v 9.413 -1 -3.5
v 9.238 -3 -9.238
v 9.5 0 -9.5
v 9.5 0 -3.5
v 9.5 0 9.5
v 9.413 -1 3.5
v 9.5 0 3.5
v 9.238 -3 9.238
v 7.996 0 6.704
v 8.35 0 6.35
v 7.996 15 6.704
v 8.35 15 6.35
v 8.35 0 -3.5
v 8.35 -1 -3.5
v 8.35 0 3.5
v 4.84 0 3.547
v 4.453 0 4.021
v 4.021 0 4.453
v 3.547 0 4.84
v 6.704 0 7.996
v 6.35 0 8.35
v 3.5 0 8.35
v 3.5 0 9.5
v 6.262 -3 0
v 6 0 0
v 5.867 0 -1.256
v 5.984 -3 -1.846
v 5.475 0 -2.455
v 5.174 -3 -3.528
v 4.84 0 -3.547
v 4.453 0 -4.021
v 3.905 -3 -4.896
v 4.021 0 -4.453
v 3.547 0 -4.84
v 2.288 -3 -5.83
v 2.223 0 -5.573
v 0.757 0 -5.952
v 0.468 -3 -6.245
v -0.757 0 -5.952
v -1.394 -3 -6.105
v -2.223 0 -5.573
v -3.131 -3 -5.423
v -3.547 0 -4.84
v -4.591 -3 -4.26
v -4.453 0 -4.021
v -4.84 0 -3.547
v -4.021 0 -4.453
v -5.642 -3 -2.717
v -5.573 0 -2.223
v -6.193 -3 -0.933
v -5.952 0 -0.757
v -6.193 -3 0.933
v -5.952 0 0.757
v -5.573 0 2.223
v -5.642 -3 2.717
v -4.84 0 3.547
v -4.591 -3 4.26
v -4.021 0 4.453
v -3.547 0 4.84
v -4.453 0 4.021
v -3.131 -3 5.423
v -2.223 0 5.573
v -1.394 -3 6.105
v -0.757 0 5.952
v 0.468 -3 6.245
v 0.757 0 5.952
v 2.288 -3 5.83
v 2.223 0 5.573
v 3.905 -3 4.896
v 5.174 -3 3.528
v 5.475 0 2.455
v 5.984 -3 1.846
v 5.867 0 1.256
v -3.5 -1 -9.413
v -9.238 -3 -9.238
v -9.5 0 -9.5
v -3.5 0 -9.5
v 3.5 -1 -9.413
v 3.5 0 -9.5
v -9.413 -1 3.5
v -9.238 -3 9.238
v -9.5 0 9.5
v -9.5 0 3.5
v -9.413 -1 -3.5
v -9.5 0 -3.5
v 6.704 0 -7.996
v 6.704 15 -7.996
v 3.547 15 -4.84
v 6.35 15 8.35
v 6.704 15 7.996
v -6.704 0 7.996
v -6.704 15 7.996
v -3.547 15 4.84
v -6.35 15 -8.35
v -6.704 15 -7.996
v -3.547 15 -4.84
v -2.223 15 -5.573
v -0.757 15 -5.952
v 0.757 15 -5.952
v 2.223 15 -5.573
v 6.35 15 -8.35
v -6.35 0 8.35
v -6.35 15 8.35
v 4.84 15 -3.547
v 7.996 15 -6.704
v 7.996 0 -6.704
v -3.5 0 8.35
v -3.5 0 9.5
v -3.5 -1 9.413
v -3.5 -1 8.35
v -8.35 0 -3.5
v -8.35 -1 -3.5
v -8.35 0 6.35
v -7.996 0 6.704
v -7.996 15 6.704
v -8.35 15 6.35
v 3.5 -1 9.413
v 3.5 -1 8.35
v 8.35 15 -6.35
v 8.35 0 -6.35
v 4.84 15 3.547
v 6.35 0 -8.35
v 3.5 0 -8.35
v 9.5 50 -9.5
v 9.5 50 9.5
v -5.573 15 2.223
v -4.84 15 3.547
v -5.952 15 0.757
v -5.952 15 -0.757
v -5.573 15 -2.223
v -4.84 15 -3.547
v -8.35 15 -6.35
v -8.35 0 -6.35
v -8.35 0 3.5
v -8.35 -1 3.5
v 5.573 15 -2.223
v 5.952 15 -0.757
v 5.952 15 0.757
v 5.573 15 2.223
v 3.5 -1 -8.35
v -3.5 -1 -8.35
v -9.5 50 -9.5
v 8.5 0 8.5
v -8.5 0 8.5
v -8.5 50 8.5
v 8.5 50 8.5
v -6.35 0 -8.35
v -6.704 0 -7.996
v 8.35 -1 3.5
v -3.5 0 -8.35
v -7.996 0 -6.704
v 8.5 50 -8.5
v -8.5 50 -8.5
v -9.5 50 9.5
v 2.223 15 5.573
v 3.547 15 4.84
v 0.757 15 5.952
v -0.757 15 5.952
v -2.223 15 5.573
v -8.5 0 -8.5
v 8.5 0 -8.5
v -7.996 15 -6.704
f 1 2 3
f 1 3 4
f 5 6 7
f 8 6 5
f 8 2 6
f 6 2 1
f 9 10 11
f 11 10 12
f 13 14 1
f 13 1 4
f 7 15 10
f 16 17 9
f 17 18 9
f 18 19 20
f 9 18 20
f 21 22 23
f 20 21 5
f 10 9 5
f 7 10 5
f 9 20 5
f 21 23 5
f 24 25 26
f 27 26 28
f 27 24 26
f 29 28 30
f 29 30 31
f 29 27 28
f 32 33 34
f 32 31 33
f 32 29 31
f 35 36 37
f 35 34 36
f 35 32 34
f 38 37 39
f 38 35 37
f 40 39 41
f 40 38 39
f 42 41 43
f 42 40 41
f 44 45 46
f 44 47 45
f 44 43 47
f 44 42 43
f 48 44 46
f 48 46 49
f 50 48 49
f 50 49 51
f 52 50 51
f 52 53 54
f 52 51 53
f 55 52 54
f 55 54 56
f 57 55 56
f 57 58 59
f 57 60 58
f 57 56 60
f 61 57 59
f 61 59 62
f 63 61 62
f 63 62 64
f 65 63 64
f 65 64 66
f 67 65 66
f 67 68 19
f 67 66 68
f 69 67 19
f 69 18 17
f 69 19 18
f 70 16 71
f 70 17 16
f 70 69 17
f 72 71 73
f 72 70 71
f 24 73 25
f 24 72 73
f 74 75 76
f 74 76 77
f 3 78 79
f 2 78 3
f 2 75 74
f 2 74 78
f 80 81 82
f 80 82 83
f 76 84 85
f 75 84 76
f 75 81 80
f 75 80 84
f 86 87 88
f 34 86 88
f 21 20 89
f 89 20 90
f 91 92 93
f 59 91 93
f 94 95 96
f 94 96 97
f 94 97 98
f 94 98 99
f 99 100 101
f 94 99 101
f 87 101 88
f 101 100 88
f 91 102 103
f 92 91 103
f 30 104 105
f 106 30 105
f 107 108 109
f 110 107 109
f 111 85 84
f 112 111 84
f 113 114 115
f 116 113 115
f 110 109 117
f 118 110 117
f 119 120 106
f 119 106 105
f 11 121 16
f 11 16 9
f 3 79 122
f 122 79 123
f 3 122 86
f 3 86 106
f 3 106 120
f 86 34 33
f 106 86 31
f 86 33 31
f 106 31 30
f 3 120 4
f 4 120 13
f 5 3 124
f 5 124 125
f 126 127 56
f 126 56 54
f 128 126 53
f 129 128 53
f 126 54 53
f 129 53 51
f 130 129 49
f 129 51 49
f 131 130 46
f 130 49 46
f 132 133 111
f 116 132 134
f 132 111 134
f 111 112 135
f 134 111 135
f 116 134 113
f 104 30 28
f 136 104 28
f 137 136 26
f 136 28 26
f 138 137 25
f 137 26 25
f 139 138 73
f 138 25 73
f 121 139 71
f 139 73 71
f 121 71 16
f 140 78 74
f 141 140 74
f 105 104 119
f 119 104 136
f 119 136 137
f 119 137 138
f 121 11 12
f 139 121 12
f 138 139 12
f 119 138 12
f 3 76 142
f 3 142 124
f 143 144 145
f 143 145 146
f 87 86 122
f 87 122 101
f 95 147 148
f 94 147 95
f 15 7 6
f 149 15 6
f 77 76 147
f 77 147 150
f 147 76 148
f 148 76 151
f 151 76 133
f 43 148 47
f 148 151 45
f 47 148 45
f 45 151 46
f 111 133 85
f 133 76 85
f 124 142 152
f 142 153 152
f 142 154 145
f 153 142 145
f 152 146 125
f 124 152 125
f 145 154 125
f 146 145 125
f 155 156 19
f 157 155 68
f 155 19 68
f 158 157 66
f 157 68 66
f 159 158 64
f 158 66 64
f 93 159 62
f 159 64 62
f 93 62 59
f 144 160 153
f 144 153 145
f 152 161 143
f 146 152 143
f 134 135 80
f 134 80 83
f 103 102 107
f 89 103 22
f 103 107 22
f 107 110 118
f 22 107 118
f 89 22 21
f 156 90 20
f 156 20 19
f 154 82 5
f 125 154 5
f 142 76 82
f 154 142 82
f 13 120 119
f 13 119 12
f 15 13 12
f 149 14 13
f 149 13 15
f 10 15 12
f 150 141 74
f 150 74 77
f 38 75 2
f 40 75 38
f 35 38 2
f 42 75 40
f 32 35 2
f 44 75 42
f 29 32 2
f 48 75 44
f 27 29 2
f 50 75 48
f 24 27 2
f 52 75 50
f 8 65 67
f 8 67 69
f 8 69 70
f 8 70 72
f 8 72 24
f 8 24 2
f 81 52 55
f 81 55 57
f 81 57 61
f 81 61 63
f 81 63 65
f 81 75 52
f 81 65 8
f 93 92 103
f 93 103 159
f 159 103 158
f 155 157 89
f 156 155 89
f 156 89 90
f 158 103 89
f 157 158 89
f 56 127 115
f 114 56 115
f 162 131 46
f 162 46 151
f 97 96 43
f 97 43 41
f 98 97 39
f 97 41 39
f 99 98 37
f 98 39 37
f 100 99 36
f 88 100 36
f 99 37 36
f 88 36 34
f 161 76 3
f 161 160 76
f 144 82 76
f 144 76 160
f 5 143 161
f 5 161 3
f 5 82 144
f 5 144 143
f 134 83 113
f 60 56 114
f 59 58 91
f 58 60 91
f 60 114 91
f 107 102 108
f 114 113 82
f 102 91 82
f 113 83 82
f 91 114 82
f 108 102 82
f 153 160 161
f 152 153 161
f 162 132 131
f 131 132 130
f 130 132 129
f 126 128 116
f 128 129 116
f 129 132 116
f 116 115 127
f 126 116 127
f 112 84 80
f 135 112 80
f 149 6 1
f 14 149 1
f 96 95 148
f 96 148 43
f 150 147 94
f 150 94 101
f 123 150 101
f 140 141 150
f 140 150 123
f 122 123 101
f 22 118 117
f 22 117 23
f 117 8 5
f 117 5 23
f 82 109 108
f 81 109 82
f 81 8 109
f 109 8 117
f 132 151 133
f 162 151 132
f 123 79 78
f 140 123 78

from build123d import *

# Parameters (mm, degrees)
F0_W            = 19
F0_H            = 19
F0_W_2          = 17
F0_H_2          = 17
F1_DEPTH        = 50
F2_W            = 16.7
F2_H            = 16.7
F2_R            = 6
F3_DEPTH        = 15
F4_W            = 19
F4_H            = 19
F4_R            = 6
F5_DEPTH        = 3
F5_TAPER        = 5
F6_W            = 7
F6_H            = 1
F7_DEPTH        = 1.15
F7_COPIES_COUNT = 4
F8_SIZE         = 2
F10_DEPTH       = 15


# Not quite as in the source:
# - a pattern or mirror of a feature is missing from the dataset's text; its kind, count and spacing are read off the source's solid


with BuildPart() as f1:
    # F0 (on Front) → F1 (new body)
    with BuildSketch(Plane.XZ):
        Rectangle(F0_W, F0_H)
        Rectangle(F0_W_2, F0_H_2, mode=Mode.SUBTRACT)
    extrude(amount=-F1_DEPTH)


with BuildPart() as f3:
    # F2 (on face) → F3 (new body)
    with BuildSketch(Plane.XZ):
        Rectangle(F2_W, F2_H)
        Circle(F2_R, mode=Mode.SUBTRACT)
    extrude(amount=-F3_DEPTH)

    # F4 (on face) → F5 (join)
    with BuildSketch(Plane.XZ):
        Rectangle(F4_W, F4_H)
        Circle(F4_R, mode=Mode.SUBTRACT)
    extrude(amount=F5_DEPTH, taper=F5_TAPER)

    # F6 (on face) → F7 (cut)
    with BuildSketch(Plane.XY.offset(9.5)):
        with Locations((0, -0.5)):
            Rectangle(F6_W, F6_H)
        with Locations((0, 0.5)):
            Rectangle(F6_W, F6_H)
    f7 = extrude(amount=-F7_DEPTH, mode=Mode.SUBTRACT)

    # F7_copies: F7 ×4 about axis
    f7_copies_axis = Axis((0, 0, 0), (0, 1, 0))
    for i in range(1, F7_COPIES_COUNT):
        add(f7.rotate(f7_copies_axis, i * 360 / F7_COPIES_COUNT), mode=Mode.SUBTRACT)

    # F8
    f8_edges = [f3.edges().sort_by_distance(p)[0] for p in [
        (8.35, 7.5, 8.35),
        (8.35, 7.5, -8.35),
        (-8.35, 7.5, -8.35),
        (-8.35, 7.5, 8.35),
    ]]
    chamfer(f8_edges, length=F8_SIZE)

    # F9 (on face) → F10 (cut, through all)
    with BuildSketch(Plane(origin=(0, 15, 0), x_dir=(-1, 0, 0), z_dir=(0, 1, 0))):
        with BuildLine():
            Line((7.9964466094, 6.7035533906), (6.7035533906, 7.9964466094))
            Line((6.7035533906, 7.9964466094), (3.5466556766, 4.8395488954))
            ThreePointArc((3.5466556766, 4.8395488954), (4.2426406871, 4.2426406871), (4.8395488954, 3.5466556766))
            Line((4.8395488954, 3.5466556766), (7.9964466094, 6.7035533906))
        make_face()
        Polygon((12.7629971477, 14.0558903665), (6.7035533906, 7.9964466094), (7.9964466094, 6.7035533906), (13.9659964202, 12.6731032014), align=None)
        with BuildLine():
            ThreePointArc((4.8395488954, 3.5466556766), (4.2426406871, 4.2426406871), (3.5466556766, 4.8395488954))
            Line((3.5466556766, 4.8395488954), (-4.8395488954, -3.5466556766))
            ThreePointArc((-4.8395488954, -3.5466556766), (-4.2426406871, -4.2426406871), (-3.5466556766, -4.8395488954))
            Line((-3.5466556766, -4.8395488954), (4.8395488954, 3.5466556766))
        make_face()
        with BuildLine():
            ThreePointArc((-3.5466556766, -4.8395488954), (-4.2426406871, -4.2426406871), (-4.8395488954, -3.5466556766))
            Line((-4.8395488954, -3.5466556766), (-7.9964466094, -6.7035533906))
            Line((-7.9964466094, -6.7035533906), (-6.7035533906, -7.9964466094))
            Line((-6.7035533906, -7.9964466094), (-3.5466556766, -4.8395488954))
        make_face()
        Polygon((-6.7035533906, -7.9964466094), (-7.9964466094, -6.7035533906), (-11.6992480187, -10.4063547999), (-10.4063547999, -11.6992480187), align=None)
    f10 = extrude(amount=-F10_DEPTH, mode=Mode.SUBTRACT)

    # F10_copies: F10 across plane
    add(f10.mirror(Plane(origin=(0, 0, 0), x_dir=(0, 0, 1), z_dir=(1, 0, 0))), mode=Mode.SUBTRACT)


solid = Compound([f1.part, f3.part])
